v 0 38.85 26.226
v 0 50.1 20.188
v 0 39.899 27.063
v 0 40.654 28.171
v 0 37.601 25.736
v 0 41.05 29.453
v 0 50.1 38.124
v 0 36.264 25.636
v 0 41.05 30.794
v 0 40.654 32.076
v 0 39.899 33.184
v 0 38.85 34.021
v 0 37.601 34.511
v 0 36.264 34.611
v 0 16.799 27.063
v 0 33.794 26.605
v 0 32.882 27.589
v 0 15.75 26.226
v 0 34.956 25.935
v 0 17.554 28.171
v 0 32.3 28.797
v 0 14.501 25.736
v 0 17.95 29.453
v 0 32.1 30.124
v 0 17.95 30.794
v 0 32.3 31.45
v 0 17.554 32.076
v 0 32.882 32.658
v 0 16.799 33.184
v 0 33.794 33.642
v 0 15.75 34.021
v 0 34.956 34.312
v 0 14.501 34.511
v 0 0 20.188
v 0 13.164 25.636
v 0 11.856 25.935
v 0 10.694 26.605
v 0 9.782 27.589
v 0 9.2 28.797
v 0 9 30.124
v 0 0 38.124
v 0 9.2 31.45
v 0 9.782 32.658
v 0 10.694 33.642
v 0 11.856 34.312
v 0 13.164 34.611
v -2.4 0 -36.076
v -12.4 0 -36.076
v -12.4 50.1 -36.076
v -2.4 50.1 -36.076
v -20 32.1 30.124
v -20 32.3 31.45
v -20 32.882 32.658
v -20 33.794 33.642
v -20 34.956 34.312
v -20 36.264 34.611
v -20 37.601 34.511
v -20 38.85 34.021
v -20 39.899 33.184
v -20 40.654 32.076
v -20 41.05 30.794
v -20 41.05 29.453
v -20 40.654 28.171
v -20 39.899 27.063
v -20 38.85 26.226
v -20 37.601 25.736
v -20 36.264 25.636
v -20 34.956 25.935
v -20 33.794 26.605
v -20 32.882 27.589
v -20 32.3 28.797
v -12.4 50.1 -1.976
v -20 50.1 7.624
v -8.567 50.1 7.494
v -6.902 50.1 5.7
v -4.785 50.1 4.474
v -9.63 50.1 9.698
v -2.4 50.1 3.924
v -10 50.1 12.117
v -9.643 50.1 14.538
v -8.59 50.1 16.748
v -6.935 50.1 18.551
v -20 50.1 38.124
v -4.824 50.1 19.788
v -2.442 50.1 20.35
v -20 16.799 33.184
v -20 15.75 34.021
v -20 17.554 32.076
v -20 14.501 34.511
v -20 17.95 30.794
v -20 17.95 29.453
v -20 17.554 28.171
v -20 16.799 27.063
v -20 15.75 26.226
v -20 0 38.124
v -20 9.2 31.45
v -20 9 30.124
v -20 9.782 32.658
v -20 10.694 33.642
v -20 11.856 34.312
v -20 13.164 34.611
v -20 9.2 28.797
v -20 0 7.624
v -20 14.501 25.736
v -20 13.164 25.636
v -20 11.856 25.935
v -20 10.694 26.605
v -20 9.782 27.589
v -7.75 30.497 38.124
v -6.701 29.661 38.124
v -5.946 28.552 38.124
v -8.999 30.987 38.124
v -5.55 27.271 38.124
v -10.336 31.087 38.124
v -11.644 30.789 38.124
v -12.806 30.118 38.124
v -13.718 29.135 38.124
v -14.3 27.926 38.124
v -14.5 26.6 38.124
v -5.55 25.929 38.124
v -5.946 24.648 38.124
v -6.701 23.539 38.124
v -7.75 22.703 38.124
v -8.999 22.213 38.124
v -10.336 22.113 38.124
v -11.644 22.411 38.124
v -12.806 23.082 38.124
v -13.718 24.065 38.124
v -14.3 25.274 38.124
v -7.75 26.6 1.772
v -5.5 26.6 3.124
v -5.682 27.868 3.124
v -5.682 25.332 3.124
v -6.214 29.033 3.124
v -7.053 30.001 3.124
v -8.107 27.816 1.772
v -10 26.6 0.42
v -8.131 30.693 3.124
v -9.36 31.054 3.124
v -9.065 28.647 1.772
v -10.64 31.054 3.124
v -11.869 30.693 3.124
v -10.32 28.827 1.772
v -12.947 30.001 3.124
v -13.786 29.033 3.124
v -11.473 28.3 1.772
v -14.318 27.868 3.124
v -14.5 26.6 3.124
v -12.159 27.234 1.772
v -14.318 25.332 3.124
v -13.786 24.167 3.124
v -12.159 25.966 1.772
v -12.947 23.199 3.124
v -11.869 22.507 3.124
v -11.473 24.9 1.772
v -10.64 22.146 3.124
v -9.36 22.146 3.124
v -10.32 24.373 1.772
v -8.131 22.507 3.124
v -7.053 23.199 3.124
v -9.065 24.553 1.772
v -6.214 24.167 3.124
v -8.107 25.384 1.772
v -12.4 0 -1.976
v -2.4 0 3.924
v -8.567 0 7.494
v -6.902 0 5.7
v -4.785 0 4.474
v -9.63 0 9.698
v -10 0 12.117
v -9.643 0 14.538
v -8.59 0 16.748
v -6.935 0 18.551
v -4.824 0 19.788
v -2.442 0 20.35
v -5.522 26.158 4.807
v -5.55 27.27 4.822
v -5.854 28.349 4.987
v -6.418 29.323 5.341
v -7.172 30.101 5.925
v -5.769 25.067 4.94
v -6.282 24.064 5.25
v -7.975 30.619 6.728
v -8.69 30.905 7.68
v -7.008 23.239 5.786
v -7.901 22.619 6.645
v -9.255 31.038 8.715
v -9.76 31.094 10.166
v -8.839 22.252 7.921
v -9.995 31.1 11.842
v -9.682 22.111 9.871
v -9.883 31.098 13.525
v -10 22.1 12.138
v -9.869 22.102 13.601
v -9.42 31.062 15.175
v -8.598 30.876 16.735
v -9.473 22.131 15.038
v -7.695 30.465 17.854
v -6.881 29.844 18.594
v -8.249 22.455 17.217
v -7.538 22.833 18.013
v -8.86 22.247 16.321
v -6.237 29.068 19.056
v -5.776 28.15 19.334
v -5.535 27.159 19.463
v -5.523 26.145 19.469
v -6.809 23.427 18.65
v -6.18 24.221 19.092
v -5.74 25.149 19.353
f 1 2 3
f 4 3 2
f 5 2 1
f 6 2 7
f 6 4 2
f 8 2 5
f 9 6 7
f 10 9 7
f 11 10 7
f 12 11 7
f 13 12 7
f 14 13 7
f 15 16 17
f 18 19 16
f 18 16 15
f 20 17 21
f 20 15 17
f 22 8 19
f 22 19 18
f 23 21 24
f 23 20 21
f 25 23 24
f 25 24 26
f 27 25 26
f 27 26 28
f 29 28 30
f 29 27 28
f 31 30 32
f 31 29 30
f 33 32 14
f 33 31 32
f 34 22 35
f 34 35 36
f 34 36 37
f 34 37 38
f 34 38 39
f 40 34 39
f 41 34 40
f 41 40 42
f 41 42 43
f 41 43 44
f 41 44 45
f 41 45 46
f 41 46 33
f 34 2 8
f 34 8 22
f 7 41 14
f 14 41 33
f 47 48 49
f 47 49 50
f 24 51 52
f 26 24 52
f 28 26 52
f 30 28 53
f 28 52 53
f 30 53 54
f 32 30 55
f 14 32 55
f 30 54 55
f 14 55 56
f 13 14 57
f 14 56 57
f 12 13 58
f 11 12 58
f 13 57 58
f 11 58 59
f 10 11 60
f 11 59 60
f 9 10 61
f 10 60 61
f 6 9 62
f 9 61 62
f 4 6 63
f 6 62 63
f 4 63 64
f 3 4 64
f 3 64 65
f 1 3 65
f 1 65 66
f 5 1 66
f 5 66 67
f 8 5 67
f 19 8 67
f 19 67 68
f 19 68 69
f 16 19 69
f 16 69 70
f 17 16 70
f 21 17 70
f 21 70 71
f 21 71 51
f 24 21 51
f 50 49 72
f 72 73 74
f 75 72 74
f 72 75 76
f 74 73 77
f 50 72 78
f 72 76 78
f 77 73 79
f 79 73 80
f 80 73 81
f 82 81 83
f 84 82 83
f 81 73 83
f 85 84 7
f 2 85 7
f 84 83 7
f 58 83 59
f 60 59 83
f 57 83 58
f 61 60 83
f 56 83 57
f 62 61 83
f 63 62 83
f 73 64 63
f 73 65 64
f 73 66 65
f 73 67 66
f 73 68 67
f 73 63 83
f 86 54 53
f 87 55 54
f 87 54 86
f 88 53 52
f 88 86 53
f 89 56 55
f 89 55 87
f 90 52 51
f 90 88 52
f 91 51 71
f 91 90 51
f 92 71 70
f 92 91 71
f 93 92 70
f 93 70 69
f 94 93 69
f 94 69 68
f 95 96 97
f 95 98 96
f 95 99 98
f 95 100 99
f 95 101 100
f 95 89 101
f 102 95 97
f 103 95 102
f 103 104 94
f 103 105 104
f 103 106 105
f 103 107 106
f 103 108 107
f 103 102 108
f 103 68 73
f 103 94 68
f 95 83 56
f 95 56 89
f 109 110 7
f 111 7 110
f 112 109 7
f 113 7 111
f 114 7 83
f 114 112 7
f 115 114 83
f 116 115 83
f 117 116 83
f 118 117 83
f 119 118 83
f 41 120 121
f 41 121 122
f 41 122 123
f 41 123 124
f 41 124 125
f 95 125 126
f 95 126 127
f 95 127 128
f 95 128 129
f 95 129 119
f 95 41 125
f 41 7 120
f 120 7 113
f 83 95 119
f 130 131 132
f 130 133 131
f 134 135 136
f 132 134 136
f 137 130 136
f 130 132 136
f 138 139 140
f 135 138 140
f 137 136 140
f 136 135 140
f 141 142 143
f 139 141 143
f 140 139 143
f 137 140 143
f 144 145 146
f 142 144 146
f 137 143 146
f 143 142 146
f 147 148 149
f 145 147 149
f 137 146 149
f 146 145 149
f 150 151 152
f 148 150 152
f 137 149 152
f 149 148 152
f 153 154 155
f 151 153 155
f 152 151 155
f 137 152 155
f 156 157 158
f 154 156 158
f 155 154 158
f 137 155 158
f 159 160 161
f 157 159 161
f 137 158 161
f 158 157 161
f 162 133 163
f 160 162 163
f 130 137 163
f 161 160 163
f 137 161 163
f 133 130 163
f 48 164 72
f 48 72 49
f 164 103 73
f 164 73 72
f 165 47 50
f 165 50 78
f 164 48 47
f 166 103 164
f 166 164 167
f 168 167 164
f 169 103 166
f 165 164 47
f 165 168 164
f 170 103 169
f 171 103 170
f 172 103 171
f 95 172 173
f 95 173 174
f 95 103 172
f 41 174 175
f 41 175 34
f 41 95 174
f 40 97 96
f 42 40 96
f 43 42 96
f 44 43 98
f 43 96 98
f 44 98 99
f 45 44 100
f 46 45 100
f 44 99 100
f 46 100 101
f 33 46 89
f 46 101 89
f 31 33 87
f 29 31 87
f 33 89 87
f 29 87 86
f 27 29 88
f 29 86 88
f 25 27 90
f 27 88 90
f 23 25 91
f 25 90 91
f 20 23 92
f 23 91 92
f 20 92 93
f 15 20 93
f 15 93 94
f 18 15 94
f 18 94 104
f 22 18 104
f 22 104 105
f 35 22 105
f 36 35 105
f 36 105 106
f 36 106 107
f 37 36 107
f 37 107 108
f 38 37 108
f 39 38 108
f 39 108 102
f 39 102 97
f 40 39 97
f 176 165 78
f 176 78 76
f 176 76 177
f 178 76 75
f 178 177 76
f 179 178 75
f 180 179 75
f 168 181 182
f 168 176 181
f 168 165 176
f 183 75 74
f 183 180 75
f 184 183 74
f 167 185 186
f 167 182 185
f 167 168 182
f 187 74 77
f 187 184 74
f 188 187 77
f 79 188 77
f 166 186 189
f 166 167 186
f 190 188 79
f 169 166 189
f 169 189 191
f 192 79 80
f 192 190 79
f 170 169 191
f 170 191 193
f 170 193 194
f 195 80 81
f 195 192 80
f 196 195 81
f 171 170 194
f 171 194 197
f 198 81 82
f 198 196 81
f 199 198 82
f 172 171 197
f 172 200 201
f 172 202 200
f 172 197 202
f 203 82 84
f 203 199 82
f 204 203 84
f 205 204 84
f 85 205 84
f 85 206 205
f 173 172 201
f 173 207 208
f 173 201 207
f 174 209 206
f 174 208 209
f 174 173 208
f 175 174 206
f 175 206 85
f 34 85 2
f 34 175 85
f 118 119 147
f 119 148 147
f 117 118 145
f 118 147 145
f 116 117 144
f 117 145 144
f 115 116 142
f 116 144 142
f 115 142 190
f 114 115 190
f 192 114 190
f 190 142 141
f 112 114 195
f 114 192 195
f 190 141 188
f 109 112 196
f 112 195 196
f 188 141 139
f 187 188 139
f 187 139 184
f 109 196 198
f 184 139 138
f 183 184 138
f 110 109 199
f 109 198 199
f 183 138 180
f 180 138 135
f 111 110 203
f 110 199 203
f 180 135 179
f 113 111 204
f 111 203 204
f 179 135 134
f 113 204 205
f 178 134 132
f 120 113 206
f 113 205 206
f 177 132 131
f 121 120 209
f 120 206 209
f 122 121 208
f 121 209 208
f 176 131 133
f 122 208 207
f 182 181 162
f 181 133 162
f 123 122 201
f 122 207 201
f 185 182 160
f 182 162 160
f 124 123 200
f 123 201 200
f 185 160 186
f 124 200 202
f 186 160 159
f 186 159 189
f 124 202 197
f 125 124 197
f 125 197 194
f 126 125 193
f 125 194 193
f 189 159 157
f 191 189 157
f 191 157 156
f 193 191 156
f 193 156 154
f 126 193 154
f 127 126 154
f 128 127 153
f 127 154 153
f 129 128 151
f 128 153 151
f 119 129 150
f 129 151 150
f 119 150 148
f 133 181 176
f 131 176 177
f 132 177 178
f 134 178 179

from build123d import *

# Parameters (mm, degrees)
F1_DEPTH = 50.1
F3_D     = 9
F5_D     = 9
F5_DEPTH = 35
F5_TIP   = 2.7038727856


with BuildPart() as f1:
    # F0 (on Front) → F1 (new body)
    with BuildSketch(Plane.XZ):
        with BuildLine():
            Line((0, 20.1881089388), (0, 38.1235034296))
            Line((0, 38.1235034296), (-20, 38.1235034296))
            Line((-20, 38.1235034296), (-20, 7.6235034296))
            Line((-20, 7.6235034296), (-12.4, -1.9764965704))
            Line((-12.4, -1.9764965704), (-12.4, -36.0764965704))
            Line((-12.4, -36.0764965704), (-2.4, -36.0764965704))
            Line((-2.4, -36.0764965704), (-2.4, 3.9235034296))
            ThreePointArc((-2.4, 3.9235034296), (-9.9117323022, 13.3413066234), (0, 20.1881089388))
        make_face()
    extrude(amount=-F1_DEPTH)

    # F3 (through all)
    with Locations(Plane.YZ):
        with Locations((13.5, 30.1235034296), (36.6, 30.1235034296)):
            Hole(F3_D / 2)

    # F5
    with Locations(Plane.XY.offset(38.1235034296)):
        with Locations((-10, 26.6)):
            Hole(F5_D / 2, depth=F5_DEPTH)
            with Locations((0, 0, -(F5_DEPTH + F5_TIP / 2))):  # 118° drill point
                Cone(0, F5_D / 2, F5_TIP, mode=Mode.SUBTRACT)


solid = f1.part
